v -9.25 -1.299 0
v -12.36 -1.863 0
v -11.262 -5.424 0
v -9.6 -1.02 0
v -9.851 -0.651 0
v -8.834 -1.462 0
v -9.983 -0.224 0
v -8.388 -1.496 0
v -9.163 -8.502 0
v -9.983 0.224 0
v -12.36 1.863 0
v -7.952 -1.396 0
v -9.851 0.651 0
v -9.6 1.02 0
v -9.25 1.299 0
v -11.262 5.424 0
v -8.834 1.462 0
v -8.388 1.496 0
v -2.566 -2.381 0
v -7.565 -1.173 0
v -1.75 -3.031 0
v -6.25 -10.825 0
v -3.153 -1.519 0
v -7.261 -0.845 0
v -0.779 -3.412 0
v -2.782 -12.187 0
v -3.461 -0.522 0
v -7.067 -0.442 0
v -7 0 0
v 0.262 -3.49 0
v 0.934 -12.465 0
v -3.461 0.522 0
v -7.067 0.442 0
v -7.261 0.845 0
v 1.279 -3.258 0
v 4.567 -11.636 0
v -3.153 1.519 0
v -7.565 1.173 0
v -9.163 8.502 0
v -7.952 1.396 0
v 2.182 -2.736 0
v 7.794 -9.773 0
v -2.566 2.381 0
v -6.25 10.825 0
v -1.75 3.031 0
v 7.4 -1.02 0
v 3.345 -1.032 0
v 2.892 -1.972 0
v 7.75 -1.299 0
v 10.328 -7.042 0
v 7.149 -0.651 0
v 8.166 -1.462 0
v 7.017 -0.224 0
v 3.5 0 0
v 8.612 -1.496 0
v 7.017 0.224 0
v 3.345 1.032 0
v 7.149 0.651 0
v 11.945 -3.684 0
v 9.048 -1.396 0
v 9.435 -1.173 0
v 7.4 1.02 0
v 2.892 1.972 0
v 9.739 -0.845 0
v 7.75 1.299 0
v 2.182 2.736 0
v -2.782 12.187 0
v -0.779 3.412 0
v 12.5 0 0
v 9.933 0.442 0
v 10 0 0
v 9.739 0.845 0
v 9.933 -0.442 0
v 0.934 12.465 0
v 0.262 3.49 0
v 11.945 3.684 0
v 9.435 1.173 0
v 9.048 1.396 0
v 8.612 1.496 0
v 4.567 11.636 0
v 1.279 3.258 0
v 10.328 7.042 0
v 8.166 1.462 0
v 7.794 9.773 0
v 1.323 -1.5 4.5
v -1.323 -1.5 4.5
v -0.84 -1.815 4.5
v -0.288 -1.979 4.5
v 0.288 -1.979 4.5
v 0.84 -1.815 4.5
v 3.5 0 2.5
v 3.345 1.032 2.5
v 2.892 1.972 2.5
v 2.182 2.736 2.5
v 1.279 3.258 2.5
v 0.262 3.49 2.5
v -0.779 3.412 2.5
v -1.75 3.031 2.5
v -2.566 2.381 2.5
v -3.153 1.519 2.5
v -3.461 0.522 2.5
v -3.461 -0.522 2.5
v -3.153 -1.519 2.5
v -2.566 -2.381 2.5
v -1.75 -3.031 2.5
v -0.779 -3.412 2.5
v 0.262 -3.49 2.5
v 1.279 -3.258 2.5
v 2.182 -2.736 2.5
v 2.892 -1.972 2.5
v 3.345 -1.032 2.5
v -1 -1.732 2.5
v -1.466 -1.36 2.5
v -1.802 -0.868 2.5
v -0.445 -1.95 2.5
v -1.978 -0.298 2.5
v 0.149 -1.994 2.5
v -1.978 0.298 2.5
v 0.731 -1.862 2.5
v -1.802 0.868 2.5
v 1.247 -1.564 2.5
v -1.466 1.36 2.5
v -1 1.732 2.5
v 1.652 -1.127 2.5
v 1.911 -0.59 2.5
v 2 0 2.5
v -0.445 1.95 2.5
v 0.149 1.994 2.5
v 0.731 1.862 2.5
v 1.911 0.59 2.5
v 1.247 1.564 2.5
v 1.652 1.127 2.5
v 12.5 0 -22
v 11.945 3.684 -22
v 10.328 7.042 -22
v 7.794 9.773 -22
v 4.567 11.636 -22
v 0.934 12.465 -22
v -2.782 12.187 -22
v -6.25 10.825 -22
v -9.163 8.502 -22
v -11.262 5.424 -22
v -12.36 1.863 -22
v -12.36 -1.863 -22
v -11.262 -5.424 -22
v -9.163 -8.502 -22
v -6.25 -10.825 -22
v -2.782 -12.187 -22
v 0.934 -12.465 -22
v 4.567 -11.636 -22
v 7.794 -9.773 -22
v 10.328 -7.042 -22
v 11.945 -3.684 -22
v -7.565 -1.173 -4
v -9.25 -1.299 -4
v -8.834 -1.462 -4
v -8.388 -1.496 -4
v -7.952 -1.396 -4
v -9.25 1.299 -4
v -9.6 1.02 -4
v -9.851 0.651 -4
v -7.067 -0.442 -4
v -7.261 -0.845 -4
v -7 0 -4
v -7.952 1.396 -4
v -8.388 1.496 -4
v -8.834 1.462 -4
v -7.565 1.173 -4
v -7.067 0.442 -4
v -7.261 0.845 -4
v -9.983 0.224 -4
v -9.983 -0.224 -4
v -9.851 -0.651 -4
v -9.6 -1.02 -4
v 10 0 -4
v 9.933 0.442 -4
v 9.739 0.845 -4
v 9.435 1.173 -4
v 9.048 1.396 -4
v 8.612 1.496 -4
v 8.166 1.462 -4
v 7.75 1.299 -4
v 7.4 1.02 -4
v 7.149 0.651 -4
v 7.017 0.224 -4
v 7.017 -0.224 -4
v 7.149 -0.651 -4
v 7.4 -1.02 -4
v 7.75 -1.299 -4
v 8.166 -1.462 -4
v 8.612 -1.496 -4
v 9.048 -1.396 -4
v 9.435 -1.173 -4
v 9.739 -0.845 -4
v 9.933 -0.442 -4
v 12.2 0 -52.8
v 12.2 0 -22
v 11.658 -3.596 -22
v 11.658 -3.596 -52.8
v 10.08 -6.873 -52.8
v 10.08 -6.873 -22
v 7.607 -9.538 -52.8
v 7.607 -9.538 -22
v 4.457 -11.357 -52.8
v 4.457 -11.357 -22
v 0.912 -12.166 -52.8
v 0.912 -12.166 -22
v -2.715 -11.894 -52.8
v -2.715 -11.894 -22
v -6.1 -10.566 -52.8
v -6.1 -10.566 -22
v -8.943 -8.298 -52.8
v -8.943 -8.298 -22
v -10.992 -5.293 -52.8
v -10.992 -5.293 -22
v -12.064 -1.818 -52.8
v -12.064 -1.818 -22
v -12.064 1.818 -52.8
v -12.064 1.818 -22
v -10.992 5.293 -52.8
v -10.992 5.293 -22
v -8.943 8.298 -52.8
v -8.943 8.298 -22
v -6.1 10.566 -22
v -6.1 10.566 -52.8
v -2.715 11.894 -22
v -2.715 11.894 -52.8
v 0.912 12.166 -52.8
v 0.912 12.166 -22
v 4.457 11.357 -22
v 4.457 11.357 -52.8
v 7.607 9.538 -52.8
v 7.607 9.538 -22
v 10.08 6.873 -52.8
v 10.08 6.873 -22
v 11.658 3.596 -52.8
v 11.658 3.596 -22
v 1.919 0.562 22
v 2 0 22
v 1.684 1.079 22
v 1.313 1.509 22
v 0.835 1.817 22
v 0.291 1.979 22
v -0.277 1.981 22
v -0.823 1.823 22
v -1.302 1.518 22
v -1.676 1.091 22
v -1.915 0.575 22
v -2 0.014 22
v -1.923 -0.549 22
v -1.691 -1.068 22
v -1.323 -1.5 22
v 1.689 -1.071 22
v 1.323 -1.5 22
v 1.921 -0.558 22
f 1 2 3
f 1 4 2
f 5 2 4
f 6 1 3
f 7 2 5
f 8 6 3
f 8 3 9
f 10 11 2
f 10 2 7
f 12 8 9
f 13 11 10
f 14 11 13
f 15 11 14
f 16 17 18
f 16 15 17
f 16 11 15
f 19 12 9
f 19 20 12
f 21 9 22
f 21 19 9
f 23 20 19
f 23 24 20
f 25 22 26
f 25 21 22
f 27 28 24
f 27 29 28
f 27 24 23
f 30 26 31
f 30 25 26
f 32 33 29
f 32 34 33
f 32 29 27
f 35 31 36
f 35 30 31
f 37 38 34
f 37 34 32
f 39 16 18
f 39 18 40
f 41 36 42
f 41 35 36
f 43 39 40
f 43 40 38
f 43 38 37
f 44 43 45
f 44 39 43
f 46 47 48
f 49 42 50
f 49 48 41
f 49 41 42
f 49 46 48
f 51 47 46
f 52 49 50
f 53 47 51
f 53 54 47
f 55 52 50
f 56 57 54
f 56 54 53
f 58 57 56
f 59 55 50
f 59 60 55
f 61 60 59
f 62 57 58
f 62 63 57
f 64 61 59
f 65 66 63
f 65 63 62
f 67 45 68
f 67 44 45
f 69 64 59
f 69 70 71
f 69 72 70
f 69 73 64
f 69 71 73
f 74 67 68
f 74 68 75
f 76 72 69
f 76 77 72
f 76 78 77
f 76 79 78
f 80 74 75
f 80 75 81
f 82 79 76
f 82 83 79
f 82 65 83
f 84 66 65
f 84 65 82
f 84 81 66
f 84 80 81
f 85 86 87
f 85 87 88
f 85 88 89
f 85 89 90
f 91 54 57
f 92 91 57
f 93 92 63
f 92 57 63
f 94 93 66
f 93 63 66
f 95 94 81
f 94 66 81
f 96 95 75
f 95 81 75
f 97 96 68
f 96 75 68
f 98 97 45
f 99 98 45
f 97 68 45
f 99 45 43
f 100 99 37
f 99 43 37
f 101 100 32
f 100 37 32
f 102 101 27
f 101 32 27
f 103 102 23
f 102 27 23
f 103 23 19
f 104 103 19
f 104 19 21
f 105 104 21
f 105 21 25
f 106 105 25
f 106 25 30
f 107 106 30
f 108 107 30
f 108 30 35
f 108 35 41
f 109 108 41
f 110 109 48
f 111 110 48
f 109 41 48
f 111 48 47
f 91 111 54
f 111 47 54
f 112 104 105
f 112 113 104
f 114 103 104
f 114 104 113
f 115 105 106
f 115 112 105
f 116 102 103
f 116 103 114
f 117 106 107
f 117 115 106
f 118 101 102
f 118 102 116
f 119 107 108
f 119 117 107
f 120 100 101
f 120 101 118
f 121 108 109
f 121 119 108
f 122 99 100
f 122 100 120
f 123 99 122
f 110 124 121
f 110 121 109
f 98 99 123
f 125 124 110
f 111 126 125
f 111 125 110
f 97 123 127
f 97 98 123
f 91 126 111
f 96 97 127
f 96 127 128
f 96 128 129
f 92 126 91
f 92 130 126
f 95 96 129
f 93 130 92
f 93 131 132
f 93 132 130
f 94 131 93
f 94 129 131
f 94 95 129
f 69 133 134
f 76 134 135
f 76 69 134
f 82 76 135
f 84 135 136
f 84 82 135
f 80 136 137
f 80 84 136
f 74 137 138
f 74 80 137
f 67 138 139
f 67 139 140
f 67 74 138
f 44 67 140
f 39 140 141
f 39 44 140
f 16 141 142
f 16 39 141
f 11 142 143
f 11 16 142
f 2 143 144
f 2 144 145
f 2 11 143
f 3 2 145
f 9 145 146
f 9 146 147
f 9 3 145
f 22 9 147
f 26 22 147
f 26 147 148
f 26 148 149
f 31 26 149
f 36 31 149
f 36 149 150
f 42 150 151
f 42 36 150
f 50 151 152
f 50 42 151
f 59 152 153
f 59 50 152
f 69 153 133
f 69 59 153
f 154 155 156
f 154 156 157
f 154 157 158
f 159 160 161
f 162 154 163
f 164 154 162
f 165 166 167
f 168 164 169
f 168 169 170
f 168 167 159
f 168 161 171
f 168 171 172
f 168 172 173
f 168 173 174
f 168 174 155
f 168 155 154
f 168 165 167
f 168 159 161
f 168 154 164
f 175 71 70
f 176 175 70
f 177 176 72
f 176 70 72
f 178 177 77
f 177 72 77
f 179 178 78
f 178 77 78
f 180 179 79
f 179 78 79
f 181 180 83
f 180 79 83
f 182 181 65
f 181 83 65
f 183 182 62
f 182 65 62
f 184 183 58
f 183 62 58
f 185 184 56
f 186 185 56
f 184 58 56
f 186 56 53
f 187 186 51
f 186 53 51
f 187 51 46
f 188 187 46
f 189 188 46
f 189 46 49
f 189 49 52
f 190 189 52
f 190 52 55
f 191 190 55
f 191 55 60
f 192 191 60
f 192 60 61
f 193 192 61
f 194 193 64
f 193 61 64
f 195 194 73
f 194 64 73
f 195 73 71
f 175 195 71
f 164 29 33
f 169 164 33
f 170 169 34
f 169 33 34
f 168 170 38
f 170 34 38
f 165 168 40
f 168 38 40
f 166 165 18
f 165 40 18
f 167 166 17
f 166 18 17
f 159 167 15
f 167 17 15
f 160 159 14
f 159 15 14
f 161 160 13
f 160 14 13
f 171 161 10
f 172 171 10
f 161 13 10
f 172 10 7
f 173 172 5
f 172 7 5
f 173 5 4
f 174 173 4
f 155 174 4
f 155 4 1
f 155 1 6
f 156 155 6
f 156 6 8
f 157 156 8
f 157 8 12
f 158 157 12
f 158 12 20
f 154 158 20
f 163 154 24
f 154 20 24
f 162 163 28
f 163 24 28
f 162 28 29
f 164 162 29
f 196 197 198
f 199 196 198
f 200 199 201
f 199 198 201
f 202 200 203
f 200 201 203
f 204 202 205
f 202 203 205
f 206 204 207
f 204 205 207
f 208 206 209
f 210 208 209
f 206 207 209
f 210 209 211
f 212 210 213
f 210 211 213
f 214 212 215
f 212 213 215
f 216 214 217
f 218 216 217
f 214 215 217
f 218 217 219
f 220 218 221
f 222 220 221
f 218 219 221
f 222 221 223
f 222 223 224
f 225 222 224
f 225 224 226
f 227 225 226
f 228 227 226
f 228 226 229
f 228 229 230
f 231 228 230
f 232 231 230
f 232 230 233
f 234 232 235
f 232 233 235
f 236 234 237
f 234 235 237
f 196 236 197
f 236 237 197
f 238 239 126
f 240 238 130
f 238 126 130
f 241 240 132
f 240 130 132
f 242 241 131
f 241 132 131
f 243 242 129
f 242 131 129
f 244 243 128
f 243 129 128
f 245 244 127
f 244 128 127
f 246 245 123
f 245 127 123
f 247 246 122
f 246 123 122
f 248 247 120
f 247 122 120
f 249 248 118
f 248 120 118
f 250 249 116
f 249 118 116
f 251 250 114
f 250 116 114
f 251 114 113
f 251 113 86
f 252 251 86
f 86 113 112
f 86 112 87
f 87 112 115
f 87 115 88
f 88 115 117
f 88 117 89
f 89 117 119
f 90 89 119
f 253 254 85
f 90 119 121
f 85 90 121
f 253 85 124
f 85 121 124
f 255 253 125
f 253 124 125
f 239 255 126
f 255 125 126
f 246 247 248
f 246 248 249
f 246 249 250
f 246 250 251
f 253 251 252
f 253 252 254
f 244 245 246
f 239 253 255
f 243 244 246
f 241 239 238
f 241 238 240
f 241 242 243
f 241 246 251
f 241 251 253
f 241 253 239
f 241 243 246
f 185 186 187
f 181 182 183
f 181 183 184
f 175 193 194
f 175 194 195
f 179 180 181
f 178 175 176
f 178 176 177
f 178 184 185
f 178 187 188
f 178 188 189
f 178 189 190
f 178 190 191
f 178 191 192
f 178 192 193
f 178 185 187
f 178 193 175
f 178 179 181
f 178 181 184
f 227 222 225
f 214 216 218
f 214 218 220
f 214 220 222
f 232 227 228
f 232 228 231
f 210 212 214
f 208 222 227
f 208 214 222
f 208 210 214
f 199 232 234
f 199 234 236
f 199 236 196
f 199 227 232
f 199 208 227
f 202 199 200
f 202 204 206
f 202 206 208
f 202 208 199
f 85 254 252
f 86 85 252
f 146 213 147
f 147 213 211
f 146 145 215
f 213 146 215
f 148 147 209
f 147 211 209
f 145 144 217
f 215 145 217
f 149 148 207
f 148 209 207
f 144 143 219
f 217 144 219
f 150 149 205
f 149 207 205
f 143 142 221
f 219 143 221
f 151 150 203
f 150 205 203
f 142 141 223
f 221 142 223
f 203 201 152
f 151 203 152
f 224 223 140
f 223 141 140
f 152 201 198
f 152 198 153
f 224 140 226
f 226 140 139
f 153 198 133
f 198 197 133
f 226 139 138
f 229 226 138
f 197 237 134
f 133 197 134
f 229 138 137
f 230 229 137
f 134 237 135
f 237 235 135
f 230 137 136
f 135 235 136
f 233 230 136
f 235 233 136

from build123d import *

# Parameters (mm, degrees)
F0_R      = 12.5
F1_DEPTH  = 22
F2_R      = 12.2
F3_DEPTH  = 30.8
F4_R      = 3.5
F5_DEPTH  = 2.5
F6_R      = 2
F7_DEPTH  = 22
F9_DEPTH  = 17.5
F10_R     = 1.5
F11_DEPTH = 4


with BuildPart() as f1:
    # F0 (on Top) → F1 (new body)
    with BuildSketch(Plane.XY):
        Circle(F0_R)
    extrude(amount=-F1_DEPTH)

    # F2 (on face) → F3 (join)
    with BuildSketch(Plane(origin=(0, 0, -22), x_dir=(1, 0, 0), z_dir=(0, 0, -1))):
        Circle(F2_R)
    extrude(amount=F3_DEPTH)

    # F4 (on face) → F5 (join)
    with BuildSketch(Plane.XY):
        Circle(F4_R)
    extrude(amount=F5_DEPTH)

    # F6 (on face) → F7 (join)
    with BuildSketch(Plane.XY):
        Circle(F6_R)
    extrude(amount=F7_DEPTH)

    # F8 (on face) → F9 (cut)
    with BuildSketch(Plane.XY.offset(22)):
        with BuildLine():
            Line((1.322876, -1.5), (-1.322876, -1.5))
            ThreePointArc((-1.322876, -1.5), (0, -2), (1.322876, -1.5))
        make_face()
    extrude(amount=-F9_DEPTH, mode=Mode.SUBTRACT)

    # F10 (on face) → F11 (cut)
    with BuildSketch(Plane.XY):
        with Locations((-8.5, 0)):
            Circle(F10_R)
        with Locations((8.5, 0)):
            Circle(F10_R)
    extrude(amount=-F11_DEPTH, mode=Mode.SUBTRACT)


solid = f1.part
